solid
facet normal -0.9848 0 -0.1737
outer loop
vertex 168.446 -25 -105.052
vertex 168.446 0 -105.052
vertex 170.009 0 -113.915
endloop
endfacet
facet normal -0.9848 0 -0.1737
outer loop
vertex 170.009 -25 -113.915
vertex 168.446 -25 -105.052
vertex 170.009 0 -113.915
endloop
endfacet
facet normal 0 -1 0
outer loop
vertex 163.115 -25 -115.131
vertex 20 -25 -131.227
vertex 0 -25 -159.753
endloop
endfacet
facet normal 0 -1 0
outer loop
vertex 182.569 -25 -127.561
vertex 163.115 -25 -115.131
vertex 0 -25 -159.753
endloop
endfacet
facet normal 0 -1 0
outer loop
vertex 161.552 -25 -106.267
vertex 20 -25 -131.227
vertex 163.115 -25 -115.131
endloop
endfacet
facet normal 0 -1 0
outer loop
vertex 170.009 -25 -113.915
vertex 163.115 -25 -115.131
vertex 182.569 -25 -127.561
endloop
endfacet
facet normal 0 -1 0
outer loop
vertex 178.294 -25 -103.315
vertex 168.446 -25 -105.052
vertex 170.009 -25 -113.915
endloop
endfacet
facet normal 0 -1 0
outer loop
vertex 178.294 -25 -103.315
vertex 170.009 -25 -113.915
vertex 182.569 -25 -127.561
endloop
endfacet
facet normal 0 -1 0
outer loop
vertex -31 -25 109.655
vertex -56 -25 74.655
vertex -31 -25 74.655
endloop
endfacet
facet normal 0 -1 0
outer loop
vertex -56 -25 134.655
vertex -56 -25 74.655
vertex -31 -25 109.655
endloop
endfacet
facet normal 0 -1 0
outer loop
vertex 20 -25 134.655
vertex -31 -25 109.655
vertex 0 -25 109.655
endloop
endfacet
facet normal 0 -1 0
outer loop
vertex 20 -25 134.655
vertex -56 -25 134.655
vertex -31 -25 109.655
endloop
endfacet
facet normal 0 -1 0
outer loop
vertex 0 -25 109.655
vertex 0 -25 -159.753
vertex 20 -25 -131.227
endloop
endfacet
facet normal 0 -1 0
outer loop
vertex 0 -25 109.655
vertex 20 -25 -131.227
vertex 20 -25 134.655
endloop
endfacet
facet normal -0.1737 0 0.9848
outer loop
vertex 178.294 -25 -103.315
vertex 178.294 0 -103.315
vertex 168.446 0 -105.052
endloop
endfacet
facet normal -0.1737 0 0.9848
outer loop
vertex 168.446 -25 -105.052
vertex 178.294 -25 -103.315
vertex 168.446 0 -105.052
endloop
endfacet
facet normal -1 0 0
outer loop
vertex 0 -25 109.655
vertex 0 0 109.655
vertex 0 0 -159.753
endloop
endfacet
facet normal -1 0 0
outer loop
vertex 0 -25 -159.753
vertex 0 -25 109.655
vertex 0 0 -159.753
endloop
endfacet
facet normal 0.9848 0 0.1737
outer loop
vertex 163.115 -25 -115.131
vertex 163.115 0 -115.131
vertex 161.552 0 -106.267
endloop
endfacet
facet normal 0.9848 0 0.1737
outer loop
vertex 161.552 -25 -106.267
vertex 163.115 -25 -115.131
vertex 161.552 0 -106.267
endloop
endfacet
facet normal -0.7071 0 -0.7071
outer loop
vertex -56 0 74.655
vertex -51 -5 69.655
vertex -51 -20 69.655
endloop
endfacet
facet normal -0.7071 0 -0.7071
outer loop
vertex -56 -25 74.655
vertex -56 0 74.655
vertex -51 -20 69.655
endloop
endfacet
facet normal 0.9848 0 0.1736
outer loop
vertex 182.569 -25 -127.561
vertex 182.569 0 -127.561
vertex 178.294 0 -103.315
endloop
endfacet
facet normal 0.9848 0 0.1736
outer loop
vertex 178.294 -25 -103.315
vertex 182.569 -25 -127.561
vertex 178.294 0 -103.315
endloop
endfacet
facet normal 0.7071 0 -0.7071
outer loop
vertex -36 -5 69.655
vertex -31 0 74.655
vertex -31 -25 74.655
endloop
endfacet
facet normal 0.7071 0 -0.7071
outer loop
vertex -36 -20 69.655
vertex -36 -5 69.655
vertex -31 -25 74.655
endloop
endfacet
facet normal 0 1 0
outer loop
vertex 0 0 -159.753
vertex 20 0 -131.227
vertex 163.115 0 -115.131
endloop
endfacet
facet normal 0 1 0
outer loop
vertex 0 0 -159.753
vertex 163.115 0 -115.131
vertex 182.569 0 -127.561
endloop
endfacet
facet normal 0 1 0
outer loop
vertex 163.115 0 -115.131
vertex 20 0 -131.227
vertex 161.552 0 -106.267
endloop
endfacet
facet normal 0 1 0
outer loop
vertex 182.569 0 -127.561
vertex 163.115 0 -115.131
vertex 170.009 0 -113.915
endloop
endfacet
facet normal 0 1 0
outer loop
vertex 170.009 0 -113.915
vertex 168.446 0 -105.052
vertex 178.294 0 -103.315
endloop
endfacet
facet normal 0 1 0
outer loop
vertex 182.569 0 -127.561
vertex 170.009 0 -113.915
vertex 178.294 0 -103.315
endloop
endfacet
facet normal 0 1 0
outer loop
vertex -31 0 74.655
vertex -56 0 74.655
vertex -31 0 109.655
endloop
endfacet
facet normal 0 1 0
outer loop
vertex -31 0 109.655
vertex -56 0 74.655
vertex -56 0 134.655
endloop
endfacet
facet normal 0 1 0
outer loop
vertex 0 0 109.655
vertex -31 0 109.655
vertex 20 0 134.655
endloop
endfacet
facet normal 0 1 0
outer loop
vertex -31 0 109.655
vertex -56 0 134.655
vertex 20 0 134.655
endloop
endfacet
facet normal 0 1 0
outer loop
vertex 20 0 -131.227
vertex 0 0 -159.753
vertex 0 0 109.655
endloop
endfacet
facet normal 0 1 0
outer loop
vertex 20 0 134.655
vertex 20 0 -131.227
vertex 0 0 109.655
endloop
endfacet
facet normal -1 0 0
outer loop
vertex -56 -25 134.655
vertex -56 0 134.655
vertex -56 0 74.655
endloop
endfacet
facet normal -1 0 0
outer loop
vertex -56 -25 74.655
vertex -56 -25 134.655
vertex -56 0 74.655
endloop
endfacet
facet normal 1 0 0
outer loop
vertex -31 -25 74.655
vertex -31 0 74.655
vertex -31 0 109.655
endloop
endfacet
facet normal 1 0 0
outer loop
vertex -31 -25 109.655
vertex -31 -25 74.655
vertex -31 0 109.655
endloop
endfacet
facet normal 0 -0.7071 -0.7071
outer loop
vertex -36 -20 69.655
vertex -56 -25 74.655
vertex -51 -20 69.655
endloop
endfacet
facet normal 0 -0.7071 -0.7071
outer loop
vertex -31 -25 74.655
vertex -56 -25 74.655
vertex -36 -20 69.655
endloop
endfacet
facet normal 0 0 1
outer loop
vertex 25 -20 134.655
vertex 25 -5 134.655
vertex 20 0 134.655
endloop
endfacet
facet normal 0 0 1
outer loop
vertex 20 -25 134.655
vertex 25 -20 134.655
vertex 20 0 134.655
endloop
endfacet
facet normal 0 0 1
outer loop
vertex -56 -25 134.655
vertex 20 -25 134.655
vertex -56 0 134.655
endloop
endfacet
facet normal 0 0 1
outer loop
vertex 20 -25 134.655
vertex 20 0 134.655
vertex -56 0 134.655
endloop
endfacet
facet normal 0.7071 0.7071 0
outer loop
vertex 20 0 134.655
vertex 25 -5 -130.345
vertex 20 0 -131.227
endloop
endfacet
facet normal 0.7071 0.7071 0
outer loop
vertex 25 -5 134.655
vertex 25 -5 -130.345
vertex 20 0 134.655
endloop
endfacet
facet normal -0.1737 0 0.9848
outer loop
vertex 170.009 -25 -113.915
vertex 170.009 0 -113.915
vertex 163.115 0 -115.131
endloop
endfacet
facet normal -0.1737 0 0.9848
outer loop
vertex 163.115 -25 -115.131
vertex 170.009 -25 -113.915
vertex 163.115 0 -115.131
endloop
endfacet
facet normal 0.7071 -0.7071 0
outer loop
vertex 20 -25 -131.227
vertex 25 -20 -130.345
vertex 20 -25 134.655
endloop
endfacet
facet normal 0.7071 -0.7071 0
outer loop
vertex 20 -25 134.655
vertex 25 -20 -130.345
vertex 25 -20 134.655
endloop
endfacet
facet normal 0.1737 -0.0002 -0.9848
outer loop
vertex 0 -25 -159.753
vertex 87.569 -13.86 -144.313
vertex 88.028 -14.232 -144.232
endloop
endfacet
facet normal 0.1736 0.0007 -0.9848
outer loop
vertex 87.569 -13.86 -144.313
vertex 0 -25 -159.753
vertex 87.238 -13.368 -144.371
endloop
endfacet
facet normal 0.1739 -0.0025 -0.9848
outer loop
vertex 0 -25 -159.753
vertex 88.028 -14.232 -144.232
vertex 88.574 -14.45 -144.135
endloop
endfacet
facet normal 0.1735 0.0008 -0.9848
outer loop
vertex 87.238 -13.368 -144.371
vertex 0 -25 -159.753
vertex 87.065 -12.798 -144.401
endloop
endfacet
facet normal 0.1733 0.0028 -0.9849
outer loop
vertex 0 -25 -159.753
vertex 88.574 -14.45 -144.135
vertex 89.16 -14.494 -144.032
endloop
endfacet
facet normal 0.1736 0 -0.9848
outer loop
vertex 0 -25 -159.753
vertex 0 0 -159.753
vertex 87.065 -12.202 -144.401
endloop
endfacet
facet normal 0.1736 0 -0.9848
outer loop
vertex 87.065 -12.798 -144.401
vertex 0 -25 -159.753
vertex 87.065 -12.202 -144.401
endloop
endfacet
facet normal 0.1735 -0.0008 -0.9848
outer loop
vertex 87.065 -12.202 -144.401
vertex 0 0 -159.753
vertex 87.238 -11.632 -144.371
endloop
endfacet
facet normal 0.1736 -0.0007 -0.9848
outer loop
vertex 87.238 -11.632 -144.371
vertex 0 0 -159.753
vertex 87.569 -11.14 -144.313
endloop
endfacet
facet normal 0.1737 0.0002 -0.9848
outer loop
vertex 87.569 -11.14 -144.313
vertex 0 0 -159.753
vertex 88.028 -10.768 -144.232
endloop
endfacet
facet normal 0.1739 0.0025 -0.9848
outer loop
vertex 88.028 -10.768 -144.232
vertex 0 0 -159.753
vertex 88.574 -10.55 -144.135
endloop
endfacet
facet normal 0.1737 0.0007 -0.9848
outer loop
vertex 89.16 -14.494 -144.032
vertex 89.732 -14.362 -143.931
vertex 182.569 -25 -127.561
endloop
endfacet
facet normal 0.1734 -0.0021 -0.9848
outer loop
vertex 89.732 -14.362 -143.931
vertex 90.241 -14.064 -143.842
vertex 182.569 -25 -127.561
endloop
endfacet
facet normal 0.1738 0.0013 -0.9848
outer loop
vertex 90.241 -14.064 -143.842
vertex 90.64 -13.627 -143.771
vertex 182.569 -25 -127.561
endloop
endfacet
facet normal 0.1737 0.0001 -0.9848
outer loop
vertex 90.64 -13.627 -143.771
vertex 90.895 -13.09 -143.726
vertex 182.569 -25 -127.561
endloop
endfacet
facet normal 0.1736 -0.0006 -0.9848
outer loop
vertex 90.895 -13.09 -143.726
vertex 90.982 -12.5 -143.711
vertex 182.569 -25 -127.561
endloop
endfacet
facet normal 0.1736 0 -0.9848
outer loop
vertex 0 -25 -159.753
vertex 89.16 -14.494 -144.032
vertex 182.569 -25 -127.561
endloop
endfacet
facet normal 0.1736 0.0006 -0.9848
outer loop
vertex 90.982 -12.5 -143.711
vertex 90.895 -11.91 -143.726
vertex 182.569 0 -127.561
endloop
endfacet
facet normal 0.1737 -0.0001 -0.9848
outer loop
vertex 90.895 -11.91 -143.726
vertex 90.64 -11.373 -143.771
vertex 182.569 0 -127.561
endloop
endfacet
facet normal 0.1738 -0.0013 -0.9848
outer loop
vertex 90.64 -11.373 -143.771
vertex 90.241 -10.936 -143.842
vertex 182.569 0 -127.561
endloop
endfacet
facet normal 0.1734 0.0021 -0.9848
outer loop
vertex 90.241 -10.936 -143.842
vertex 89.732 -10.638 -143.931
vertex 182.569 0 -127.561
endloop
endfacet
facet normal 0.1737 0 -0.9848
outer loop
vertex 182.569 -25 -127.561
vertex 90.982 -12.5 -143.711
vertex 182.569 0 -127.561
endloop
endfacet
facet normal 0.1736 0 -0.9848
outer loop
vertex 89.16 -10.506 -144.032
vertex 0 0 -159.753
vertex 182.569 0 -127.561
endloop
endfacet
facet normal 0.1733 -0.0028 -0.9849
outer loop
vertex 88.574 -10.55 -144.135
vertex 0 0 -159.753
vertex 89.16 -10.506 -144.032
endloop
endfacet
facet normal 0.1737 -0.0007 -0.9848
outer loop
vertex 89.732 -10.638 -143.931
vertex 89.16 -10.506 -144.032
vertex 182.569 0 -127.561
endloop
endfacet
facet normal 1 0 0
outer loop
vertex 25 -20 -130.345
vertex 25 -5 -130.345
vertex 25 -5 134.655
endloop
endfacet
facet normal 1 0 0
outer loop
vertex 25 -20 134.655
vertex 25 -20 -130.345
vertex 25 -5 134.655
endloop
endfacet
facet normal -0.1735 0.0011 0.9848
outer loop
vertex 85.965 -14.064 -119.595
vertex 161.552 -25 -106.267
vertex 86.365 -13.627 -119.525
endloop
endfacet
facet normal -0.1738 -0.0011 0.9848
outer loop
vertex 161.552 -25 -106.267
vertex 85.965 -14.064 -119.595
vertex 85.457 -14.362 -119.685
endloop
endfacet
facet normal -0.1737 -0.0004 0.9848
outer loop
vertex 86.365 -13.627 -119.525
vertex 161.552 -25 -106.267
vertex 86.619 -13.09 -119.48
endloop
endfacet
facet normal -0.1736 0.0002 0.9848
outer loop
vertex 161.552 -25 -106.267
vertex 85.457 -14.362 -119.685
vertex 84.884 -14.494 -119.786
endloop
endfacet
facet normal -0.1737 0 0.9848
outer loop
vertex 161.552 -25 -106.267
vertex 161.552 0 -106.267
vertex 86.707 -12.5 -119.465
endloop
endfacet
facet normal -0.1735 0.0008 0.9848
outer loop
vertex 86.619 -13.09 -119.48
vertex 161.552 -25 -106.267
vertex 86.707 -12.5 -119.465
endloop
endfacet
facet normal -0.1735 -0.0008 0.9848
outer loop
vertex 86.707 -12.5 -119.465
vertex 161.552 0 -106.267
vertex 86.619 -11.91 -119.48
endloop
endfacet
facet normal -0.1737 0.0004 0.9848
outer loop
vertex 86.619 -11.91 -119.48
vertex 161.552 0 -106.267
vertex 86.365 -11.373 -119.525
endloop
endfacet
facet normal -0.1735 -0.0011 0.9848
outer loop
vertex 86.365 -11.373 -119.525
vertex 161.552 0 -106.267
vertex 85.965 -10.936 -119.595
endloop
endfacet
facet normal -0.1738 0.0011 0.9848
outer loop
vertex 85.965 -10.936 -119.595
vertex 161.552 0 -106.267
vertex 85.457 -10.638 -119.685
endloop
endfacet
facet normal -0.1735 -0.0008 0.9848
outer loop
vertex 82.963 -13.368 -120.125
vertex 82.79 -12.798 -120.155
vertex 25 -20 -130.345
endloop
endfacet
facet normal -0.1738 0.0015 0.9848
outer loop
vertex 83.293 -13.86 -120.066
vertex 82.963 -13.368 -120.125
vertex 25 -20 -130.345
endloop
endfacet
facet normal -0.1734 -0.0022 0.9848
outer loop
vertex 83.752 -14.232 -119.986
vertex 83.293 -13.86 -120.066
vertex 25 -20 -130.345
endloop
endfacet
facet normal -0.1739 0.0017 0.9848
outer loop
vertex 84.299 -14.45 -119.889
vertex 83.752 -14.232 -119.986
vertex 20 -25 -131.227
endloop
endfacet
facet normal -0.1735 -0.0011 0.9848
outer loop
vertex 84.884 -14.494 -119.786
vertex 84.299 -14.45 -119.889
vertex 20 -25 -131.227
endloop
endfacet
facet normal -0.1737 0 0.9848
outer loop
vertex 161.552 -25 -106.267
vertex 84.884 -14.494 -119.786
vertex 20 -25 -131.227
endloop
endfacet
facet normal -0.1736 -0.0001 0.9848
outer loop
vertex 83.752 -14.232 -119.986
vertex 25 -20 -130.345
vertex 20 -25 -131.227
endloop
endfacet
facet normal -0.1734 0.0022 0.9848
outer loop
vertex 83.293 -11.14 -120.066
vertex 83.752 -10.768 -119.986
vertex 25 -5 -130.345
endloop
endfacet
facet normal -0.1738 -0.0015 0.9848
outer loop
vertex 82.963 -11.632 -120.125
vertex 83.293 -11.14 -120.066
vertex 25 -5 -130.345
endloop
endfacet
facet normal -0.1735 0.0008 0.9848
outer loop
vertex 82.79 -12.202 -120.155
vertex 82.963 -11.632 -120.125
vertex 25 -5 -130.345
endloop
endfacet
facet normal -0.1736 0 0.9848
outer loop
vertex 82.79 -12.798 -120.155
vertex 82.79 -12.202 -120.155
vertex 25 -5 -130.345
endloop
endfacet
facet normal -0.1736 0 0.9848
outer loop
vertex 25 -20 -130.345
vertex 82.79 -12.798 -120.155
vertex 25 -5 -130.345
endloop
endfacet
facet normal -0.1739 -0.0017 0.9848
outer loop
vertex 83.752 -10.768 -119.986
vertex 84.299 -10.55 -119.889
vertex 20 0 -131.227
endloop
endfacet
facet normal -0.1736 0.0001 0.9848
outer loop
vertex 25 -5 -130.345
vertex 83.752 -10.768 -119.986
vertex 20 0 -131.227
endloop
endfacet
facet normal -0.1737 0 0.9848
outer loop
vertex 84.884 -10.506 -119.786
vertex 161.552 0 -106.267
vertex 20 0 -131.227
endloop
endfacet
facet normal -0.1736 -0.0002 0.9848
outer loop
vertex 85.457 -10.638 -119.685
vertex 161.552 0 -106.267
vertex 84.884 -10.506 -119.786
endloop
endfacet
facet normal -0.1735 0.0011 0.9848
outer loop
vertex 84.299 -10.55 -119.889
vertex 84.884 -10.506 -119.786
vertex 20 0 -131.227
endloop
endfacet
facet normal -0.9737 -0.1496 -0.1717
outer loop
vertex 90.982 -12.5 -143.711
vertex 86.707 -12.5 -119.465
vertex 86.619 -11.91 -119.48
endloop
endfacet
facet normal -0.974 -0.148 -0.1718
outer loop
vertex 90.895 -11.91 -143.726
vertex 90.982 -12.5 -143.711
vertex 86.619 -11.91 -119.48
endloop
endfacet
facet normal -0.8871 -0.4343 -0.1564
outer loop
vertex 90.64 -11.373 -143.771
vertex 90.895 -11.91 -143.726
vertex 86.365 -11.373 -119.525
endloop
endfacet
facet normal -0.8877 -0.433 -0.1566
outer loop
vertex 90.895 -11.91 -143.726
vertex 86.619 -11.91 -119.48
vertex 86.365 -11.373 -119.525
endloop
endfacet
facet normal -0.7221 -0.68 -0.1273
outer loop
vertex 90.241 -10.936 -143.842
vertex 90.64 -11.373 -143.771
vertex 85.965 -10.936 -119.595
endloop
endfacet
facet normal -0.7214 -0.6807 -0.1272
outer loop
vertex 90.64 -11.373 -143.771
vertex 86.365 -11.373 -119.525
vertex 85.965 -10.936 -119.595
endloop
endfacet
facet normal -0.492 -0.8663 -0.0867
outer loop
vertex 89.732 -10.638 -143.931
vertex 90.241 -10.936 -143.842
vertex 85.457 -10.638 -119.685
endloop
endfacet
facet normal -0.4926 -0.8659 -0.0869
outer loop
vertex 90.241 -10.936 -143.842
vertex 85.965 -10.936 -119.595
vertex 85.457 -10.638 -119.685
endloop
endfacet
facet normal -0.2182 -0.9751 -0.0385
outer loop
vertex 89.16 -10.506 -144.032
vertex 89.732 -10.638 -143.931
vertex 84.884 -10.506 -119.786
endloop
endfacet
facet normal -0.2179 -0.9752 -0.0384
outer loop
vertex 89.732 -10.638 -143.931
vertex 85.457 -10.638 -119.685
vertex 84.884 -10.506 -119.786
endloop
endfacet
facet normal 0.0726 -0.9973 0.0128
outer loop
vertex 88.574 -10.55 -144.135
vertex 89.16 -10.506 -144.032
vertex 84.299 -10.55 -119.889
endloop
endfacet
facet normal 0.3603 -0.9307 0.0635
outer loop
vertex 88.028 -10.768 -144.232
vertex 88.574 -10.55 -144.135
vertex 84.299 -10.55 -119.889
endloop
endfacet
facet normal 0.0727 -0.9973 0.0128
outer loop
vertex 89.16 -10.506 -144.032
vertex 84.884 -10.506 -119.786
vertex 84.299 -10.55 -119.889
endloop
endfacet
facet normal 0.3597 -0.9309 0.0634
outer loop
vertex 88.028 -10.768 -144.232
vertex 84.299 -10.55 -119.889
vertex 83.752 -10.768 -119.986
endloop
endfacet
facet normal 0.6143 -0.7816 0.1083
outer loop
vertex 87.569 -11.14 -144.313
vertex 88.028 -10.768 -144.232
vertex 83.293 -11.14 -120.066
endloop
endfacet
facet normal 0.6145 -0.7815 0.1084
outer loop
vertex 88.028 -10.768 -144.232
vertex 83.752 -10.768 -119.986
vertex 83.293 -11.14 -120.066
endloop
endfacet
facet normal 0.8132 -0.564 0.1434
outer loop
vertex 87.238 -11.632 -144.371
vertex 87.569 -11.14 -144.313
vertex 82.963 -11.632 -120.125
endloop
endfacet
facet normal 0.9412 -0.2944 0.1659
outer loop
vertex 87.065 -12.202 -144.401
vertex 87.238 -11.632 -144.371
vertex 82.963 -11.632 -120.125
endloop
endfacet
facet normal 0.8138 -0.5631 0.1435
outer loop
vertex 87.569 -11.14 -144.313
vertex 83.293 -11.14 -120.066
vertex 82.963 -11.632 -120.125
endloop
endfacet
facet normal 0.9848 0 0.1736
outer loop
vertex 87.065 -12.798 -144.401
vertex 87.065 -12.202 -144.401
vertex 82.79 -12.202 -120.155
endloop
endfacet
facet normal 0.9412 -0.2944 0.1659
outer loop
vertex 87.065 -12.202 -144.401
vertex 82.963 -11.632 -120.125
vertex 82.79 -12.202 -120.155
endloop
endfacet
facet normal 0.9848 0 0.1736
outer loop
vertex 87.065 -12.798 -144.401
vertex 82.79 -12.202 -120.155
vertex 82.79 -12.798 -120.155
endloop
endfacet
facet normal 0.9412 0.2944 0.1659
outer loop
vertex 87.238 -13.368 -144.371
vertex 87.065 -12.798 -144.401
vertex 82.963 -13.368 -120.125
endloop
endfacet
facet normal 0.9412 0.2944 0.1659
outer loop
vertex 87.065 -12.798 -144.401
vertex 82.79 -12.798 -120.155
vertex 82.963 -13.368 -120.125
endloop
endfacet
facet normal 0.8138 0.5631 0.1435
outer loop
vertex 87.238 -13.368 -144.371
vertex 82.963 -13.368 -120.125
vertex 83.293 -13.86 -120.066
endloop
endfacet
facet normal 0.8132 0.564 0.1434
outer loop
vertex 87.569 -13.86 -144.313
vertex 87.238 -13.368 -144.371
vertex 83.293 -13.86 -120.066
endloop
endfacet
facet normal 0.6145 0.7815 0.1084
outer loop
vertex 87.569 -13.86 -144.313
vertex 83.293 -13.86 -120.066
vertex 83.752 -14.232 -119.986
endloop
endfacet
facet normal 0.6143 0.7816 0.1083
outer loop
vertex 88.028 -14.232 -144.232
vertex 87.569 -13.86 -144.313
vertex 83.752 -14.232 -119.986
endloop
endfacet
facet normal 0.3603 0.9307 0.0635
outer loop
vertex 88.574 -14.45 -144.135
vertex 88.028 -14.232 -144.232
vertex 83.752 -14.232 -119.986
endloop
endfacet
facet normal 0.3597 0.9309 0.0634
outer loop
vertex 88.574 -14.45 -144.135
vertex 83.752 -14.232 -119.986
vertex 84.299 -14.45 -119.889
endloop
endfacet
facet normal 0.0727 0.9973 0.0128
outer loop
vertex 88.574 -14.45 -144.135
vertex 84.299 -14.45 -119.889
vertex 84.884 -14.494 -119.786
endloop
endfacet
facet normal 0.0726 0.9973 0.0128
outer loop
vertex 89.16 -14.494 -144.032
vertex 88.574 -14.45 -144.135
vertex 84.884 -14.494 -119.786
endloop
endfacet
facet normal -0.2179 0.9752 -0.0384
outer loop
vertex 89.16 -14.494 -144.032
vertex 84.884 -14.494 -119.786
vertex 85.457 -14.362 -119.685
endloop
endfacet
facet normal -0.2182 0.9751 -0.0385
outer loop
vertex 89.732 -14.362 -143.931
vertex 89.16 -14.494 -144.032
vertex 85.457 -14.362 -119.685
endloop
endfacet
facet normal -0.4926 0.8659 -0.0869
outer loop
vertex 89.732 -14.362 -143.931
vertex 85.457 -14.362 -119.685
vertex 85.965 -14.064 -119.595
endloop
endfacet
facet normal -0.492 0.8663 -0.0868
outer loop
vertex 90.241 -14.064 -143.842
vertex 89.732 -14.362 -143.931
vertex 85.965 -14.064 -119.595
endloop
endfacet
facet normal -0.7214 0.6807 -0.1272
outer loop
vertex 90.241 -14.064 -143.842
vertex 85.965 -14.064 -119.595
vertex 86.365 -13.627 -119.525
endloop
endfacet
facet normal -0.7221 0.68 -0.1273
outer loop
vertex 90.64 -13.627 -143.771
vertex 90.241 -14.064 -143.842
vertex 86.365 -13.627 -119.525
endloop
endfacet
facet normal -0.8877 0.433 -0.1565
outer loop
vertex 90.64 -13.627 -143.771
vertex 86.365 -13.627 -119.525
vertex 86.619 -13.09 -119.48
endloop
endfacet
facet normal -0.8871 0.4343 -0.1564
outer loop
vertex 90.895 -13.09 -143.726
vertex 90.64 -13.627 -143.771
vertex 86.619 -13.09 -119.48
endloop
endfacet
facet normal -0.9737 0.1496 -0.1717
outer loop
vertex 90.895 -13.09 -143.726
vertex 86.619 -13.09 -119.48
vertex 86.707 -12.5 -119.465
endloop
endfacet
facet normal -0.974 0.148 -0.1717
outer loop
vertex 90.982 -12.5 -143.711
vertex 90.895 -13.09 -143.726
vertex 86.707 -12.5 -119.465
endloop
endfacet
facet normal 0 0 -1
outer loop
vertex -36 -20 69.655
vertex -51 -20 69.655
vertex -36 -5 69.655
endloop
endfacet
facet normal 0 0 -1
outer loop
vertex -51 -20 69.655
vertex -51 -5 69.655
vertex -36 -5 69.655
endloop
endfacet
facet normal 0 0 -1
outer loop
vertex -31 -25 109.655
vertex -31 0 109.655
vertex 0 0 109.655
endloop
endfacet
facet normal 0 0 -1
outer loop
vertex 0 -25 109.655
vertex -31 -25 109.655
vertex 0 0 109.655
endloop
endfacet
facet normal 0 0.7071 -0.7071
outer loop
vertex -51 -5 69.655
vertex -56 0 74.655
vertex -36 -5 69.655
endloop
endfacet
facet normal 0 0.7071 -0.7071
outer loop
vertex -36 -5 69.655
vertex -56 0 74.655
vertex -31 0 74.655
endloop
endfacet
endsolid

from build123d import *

# Parameters (mm, degrees)
F1_DEPTH = 25
F2_R     = 2
F3_DEPTH = 27
F4_SIZE  = 5


with BuildPart() as f1:
    # F0 (on Front) → F1 (new body)
    with BuildSketch(Plane.XZ):
        Polygon((-56, 134.6547987339), (-56, 69.6547987339), (-31, 69.6547987339), (-31, 109.6547987339), (0, 109.6547987339), (0, -155.3452012661), (0, -159.7533757838), (25, -155.3452012661), (182.569240482, -127.5614928394), (178.2939886904, -103.3153350796), (168.4459111603, -105.0518168562), (170.0087447593, -113.9150866333), (163.1150904882, -115.130623877), (161.5522568892, -106.2673540999), (25, -130.3452012661), (25, 134.6547987339), align=None)
    extrude(amount=F1_DEPTH)

    # F2 (on face) → F3 (cut)
    with BuildSketch(Plane(origin=(23.0441844496, 0, -130.6900643169), x_dir=(0.984807753, 0, 0.1736481777), z_dir=(-0.1736481777, 0, 0.984807753))):
        with Locations((62.6447827161, -12.5)):
            Circle(F2_R)
    extrude(amount=-F3_DEPTH, mode=Mode.SUBTRACT)

    # F4
    f4_edges = [f1.edges().sort_by_distance(p)[0] for p in [
        (25, -25, 2.154799),
        (25, 0, 2.154799),
        (-43.5, -25, 69.654799),
        (-56, -12.5, 69.654799),
        (-31, -12.5, 69.654799),
        (-43.5, 0, 69.654799),
    ]]
    chamfer(f4_edges, length=F4_SIZE)


solid = f1.part
